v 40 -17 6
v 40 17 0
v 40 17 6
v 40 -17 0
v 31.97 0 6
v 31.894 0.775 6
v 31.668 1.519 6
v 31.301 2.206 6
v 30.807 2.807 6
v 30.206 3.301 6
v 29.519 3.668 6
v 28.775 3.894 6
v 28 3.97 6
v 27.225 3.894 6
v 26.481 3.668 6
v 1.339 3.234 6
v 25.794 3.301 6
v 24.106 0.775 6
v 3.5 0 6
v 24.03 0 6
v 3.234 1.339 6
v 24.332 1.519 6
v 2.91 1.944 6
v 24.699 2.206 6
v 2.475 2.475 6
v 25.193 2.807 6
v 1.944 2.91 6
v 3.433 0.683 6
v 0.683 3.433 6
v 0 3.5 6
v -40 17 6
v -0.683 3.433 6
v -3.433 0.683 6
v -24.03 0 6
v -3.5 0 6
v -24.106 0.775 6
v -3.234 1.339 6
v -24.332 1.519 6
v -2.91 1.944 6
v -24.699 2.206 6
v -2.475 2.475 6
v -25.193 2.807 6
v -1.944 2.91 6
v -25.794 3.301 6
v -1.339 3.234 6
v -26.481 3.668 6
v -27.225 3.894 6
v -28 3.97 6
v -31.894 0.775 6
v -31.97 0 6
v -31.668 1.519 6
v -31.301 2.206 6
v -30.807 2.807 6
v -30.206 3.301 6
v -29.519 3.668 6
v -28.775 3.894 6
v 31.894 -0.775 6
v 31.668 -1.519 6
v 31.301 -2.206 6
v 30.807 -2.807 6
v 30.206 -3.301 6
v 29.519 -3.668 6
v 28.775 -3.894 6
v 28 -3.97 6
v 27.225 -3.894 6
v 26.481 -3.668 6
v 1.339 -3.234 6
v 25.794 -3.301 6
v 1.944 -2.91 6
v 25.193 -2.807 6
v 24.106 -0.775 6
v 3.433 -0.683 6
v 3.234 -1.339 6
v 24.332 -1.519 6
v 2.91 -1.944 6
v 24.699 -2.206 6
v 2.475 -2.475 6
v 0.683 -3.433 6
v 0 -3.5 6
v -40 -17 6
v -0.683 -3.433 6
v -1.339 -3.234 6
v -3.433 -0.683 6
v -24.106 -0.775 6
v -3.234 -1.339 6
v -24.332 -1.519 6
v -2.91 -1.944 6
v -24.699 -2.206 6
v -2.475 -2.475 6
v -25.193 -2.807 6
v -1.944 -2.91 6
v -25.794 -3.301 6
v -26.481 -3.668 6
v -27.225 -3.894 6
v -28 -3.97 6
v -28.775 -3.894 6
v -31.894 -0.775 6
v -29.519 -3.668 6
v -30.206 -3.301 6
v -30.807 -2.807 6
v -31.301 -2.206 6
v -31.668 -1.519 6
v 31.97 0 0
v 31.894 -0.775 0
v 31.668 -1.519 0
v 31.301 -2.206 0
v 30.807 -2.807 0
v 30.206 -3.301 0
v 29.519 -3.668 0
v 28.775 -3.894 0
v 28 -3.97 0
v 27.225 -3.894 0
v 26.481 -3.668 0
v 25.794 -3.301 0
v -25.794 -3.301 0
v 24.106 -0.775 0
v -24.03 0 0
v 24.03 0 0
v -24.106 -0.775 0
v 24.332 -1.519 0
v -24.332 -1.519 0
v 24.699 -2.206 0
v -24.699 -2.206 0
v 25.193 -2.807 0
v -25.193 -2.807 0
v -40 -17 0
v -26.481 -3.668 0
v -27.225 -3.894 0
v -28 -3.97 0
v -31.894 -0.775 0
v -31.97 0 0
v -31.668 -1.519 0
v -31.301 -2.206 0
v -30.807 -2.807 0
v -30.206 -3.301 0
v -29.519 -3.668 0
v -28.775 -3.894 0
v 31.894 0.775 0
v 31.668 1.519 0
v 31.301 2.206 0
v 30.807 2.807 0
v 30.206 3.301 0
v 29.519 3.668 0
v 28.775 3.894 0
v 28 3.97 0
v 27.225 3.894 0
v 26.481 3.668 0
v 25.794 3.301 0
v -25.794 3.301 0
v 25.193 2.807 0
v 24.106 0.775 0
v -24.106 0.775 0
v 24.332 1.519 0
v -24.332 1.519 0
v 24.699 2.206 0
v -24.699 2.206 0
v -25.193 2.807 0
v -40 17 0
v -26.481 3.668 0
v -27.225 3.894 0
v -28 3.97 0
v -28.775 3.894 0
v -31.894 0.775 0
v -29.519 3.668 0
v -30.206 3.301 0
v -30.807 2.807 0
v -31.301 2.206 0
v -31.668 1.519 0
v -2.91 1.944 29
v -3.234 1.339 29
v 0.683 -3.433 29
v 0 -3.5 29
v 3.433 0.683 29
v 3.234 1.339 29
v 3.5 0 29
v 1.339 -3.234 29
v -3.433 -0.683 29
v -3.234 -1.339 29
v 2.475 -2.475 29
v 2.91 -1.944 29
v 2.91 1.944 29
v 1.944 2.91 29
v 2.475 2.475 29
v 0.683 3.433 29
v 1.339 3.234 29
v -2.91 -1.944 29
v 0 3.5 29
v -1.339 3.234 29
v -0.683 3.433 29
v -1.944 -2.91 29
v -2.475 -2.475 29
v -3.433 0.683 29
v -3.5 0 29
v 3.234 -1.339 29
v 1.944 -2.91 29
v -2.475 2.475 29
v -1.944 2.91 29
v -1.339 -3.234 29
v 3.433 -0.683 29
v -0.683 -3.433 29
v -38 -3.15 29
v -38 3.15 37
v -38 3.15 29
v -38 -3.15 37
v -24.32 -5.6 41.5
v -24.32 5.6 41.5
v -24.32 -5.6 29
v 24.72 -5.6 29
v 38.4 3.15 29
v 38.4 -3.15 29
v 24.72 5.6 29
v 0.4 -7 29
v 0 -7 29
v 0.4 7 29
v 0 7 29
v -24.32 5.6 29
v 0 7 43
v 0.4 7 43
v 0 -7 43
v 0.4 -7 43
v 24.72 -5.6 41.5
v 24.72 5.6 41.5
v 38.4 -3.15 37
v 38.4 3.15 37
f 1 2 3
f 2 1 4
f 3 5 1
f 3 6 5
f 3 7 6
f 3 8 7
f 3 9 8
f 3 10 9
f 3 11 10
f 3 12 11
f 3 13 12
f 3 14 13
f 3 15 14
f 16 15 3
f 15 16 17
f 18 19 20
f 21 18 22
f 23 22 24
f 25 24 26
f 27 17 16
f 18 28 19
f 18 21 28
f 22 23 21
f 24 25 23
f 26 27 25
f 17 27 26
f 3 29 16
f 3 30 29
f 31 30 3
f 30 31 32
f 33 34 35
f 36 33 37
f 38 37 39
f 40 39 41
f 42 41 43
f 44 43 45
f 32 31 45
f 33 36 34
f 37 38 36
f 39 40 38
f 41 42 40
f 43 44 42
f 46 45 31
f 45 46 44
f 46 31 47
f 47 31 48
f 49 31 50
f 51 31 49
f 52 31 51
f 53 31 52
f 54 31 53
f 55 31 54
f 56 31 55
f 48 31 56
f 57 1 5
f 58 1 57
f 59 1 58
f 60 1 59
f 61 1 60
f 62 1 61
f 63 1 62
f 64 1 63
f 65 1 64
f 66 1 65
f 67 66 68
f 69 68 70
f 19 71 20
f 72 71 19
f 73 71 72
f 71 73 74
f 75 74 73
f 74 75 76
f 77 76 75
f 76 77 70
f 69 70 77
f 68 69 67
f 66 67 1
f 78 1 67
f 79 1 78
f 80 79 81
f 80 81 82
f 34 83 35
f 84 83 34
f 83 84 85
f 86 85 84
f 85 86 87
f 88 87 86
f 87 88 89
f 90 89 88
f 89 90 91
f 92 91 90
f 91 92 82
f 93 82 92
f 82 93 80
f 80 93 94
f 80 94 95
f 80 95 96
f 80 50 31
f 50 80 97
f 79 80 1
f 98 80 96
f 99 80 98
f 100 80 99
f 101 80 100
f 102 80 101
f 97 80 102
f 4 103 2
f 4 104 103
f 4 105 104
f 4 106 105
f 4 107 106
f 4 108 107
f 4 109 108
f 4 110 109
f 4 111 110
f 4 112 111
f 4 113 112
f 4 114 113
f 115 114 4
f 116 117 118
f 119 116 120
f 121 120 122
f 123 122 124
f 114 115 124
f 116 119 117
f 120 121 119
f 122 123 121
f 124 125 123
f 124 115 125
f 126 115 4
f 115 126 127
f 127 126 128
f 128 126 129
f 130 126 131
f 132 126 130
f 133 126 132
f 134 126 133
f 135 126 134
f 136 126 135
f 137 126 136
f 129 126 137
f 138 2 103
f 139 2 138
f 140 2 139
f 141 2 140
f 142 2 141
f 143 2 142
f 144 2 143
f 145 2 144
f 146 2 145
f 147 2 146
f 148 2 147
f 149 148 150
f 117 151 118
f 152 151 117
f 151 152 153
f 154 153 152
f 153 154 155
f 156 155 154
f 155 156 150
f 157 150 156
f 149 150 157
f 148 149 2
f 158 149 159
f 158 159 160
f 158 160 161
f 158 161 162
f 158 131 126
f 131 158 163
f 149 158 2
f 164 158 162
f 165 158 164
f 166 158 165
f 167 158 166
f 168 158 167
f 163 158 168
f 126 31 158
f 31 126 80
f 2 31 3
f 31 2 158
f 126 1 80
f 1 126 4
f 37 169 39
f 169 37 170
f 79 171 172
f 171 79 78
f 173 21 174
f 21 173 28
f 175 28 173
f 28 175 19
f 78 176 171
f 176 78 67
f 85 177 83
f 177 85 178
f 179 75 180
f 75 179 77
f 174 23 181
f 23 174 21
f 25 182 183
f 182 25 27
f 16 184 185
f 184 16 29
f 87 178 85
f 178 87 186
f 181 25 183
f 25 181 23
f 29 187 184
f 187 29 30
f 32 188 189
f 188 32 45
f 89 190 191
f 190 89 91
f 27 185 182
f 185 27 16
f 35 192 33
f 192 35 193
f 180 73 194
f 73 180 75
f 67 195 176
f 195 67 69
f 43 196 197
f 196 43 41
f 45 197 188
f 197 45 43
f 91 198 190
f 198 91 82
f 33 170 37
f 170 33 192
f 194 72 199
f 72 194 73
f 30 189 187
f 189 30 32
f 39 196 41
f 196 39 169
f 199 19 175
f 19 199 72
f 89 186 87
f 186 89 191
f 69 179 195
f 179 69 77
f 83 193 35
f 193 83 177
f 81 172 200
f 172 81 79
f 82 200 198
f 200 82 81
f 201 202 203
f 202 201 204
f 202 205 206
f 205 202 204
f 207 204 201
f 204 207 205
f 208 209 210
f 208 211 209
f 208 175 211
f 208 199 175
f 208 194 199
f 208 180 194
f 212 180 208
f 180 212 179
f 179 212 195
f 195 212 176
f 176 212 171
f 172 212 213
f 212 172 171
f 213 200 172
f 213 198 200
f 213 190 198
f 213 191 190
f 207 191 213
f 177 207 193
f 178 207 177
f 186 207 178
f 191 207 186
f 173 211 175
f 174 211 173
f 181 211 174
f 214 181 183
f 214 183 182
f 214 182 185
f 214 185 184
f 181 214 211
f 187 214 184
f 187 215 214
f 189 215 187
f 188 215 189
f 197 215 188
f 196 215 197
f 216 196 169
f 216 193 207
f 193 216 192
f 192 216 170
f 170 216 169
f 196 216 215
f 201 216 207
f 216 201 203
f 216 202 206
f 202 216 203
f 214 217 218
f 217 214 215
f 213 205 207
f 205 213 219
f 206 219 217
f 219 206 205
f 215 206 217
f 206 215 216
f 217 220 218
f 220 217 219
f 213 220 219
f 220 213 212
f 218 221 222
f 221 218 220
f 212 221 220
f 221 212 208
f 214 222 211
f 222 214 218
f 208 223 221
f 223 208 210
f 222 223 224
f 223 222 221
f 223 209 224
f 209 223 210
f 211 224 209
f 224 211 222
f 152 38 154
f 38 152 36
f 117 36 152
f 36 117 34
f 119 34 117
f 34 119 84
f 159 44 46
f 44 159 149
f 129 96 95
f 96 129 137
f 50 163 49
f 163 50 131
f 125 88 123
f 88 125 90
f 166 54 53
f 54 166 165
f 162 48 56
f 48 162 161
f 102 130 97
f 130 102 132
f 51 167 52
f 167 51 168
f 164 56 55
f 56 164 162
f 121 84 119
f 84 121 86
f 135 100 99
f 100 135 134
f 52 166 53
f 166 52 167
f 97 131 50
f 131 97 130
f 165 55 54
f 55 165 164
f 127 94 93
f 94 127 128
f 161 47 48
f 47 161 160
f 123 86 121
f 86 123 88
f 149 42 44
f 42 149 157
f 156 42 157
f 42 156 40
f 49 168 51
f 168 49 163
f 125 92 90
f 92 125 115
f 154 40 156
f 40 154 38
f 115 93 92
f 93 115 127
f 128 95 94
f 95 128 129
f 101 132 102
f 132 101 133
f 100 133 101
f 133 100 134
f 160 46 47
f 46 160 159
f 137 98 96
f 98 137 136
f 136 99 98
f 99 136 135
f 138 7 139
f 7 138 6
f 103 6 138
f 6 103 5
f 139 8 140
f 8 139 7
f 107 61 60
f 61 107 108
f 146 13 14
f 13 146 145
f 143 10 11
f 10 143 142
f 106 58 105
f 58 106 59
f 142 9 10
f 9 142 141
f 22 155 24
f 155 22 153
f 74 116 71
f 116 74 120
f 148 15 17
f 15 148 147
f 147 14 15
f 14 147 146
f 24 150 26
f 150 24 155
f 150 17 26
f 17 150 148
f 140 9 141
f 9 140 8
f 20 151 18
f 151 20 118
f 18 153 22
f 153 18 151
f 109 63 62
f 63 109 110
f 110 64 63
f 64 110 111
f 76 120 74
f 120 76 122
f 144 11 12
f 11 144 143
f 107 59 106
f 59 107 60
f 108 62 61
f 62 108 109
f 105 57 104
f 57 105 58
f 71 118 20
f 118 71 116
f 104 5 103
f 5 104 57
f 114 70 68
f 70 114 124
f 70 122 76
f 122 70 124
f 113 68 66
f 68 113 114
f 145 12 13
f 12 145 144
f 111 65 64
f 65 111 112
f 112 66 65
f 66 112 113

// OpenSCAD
$fn = 32;

// ----------------------------------------------------------------------
// Boat cleat: 80 mm base, horn 36 mm up
// ----------------------------------------------------------------------

// --- parameters (mm) ---
base_l = 80;              // base length
base_w = 34;              // base width
base_t = 6;               // base thickness
horn_len = 76;            // horn length
horn_d = 14;              // horn diameter at the middle
horn_z = 36;              // horn axis height
end_drop = 6;             // how far the horn tips drop
post_d = 7;               // centre post diameter
holes_d = 7.94;           // fixing holes
hole_x = 28;              // fixing hole spacing

difference() {
  union() {
    translate([-40, -17, 0]) cube([base_l, base_w, base_t]);
    /* centre post, sunk 1 mm into the base */
    translate([0, 0, 5]) cylinder(h = 31, d = post_d);
    /* horn: a hull chain of boxes, full in the middle and lighter at the tips */
    hull() {
      translate([-38, -3.15, 29]) cube([0.4, 6.3, 8], center = false);
      translate([-24.32, -5.6, 29]) cube([0.4, 11.2, 12.5], center = false);
    }
    hull() {
      translate([-24.32, -5.6, 29]) cube([0.4, 11.2, 12.5], center = false);
      translate([0, -7, 29]) cube([0.4, 14, 14], center = false);
    }
    hull() {
      translate([0, -7, 29]) cube([0.4, 14, 14], center = false);
      translate([24.32, -5.6, 29]) cube([0.4, 11.2, 12.5], center = false);
    }
    hull() {
      translate([24.32, -5.6, 29]) cube([0.4, 11.2, 12.5], center = false);
      translate([38, -3.15, 29]) cube([0.4, 6.3, 8], center = false);
    }
  }
  translate([-28, 0, -2.5]) cylinder(h = base_t + 5, d = holes_d);
  translate([28, 0, -2.5]) cylinder(h = base_t + 5, d = holes_d);
}
